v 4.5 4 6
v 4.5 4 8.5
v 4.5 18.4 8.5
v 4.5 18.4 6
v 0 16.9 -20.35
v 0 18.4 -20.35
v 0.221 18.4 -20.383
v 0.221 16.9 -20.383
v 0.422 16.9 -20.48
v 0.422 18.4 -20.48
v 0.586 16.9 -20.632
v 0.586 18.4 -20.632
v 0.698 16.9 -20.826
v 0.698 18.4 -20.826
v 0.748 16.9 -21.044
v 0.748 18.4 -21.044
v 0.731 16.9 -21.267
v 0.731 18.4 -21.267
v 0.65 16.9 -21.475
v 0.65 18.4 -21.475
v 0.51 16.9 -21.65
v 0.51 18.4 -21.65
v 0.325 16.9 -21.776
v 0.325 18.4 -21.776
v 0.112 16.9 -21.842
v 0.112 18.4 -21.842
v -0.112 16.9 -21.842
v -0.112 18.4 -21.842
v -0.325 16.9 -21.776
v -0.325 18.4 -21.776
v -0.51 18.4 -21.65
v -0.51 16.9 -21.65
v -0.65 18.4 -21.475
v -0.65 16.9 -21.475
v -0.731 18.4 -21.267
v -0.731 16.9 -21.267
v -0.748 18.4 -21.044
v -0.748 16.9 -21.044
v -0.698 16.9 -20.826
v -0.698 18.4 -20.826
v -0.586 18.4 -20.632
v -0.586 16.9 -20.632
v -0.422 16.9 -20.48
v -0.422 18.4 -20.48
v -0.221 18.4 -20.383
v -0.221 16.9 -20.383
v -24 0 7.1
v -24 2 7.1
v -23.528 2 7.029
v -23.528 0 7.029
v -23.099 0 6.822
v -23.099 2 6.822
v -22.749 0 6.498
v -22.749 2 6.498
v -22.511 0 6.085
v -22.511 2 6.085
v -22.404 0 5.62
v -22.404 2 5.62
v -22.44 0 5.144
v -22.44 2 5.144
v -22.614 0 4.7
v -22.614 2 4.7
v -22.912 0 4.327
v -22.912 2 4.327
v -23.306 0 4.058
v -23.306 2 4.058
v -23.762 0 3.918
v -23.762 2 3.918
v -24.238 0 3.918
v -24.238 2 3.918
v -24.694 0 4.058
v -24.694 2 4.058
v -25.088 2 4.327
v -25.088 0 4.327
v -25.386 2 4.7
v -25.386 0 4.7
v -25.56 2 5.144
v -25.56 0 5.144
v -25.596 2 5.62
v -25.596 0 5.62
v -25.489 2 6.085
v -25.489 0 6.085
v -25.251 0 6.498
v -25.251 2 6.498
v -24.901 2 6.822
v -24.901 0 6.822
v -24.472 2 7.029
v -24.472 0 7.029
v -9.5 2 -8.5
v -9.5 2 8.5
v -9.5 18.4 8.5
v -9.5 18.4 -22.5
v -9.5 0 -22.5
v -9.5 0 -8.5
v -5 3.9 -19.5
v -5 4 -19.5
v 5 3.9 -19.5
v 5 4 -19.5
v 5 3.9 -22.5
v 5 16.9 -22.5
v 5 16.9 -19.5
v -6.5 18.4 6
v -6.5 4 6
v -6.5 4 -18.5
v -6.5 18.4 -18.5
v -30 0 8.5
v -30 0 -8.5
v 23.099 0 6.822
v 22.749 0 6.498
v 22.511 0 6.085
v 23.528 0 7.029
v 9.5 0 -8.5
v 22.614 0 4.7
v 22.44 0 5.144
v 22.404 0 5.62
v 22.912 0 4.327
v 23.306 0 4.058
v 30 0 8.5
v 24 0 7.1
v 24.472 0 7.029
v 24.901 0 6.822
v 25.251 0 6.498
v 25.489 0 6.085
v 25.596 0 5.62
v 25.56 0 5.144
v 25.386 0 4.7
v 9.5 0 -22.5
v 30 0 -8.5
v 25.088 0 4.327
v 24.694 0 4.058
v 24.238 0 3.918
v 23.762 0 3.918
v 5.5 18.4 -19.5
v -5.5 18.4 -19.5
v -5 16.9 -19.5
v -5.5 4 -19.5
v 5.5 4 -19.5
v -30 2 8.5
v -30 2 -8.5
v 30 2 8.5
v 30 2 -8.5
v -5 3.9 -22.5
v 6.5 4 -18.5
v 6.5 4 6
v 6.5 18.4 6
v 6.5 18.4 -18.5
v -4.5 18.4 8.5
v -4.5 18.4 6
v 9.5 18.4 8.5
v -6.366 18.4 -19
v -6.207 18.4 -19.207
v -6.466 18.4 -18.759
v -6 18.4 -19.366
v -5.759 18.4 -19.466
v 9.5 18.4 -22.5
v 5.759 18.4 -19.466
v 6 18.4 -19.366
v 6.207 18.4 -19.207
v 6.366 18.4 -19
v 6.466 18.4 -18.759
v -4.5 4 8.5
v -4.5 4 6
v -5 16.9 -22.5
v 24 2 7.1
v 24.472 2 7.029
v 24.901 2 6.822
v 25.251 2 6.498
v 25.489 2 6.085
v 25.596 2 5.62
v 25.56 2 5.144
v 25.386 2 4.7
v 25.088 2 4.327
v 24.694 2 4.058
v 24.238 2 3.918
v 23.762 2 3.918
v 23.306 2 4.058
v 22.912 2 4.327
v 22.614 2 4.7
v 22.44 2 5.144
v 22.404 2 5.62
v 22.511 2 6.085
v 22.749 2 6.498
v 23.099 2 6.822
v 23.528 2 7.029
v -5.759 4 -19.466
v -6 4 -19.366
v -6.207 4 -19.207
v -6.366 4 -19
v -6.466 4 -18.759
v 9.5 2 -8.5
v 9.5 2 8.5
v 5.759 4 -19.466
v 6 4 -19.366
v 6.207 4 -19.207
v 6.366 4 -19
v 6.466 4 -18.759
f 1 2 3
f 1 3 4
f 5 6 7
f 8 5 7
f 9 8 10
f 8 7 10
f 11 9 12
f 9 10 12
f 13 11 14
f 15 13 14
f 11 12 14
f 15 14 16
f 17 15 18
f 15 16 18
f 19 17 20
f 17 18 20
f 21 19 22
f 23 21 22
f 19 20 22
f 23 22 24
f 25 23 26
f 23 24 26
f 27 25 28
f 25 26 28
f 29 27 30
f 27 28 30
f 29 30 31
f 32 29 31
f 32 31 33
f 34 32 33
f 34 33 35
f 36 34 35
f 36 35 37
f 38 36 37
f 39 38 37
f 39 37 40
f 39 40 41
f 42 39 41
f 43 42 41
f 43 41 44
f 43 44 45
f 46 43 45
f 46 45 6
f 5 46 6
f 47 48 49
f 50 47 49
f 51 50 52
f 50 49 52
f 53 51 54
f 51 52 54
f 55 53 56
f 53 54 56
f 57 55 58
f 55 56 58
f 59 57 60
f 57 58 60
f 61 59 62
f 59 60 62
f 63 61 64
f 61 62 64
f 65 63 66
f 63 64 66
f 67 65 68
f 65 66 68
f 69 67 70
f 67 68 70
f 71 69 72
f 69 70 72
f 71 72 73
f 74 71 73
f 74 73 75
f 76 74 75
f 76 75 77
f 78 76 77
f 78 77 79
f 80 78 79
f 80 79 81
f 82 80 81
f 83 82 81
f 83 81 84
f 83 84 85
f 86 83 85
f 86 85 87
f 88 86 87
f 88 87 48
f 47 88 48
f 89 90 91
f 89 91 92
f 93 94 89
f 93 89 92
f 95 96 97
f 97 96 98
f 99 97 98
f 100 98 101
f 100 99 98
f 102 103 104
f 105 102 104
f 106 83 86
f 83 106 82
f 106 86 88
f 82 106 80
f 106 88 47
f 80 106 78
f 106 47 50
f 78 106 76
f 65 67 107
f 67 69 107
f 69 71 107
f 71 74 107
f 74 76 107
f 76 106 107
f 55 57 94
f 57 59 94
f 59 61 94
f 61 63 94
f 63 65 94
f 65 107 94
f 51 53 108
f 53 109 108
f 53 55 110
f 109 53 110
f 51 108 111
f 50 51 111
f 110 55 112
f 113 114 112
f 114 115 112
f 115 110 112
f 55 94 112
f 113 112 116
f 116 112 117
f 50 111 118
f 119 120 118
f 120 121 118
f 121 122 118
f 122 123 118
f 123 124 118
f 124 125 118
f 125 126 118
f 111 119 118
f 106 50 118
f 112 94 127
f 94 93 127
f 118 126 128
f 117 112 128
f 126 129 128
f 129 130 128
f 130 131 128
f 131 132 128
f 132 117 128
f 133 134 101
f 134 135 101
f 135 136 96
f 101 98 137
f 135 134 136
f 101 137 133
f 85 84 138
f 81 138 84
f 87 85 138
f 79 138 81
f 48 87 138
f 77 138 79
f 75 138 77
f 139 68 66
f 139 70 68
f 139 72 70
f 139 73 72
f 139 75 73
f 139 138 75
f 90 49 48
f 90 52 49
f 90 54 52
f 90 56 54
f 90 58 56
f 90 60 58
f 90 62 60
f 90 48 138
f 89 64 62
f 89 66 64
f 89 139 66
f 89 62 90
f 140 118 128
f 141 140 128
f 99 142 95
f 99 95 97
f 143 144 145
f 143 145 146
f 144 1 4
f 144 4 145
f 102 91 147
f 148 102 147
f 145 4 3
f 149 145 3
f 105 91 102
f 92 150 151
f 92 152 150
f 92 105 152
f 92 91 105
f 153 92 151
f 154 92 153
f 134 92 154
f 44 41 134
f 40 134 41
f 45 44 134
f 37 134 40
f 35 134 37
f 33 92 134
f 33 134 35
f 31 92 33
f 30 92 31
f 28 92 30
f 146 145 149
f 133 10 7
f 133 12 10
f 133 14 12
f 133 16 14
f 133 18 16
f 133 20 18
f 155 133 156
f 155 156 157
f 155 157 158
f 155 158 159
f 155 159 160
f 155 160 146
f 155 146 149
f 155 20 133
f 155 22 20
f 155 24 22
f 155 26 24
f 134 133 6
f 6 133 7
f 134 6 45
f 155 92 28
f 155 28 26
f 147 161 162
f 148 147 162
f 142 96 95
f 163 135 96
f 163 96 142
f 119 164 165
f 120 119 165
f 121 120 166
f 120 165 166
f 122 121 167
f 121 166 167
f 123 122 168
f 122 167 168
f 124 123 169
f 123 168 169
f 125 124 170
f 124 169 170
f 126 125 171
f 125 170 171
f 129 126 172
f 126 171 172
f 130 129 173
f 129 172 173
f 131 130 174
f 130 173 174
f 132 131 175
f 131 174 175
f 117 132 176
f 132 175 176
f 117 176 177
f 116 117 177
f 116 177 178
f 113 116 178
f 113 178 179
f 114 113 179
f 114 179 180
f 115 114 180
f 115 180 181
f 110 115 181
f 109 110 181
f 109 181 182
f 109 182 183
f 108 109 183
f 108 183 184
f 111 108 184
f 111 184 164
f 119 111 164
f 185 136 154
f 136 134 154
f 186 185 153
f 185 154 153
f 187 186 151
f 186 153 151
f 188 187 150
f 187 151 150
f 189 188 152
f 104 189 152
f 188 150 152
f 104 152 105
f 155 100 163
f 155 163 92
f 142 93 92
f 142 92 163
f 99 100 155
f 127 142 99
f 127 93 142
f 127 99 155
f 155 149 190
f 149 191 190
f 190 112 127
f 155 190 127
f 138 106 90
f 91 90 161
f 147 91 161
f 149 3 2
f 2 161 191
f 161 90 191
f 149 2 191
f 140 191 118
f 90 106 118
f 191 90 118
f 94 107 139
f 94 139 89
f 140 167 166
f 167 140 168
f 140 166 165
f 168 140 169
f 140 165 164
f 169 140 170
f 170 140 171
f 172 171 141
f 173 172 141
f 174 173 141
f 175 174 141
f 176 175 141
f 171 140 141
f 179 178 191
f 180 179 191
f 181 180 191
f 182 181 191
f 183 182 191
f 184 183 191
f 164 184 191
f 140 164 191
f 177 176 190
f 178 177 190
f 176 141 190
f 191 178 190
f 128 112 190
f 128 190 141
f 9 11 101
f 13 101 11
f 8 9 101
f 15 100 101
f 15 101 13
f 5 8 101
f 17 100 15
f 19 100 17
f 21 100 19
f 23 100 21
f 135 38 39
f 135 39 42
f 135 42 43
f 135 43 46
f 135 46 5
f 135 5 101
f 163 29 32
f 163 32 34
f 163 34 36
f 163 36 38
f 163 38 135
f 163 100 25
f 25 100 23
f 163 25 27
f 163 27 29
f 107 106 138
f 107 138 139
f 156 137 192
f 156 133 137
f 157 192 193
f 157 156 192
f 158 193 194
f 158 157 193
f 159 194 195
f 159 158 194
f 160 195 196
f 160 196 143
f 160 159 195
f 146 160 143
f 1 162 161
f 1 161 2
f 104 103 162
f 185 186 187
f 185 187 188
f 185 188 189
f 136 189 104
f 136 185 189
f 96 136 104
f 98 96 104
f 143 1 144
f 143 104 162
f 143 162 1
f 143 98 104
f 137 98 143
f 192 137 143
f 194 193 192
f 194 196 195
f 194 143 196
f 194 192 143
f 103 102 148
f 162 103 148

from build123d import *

# Parameters (mm, degrees)
SKETCH1_W           = 60
SKETCH1_H           = 17
BOSS_EXTRUDE1_DEPTH = 4
SKETCH4_W           = 19
SKETCH4_H           = 4
BOSS_EXTRUDE2_DEPTH = 14
SKETCH5_W           = 3
SKETCH5_H           = 31
BOSS_EXTRUDE3_DEPTH = 14.4
SKETCH6_W           = 13
SKETCH6_H           = 2.5
BOSS_EXTRUDE4_DEPTH = 14.4
SKETCH7_W           = 9
SKETCH7_H           = 2.5
CUT_EXTRUDE1_DEPTH  = 14.4
SKETCH8_W           = 13
SKETCH8_H           = 3
BOSS_EXTRUDE5_DEPTH = 14.4
SKETCH9_R           = 0.75
CUT_EXTRUDE2_DEPTH  = 6
SKETCH10_W          = 10
SKETCH10_H          = 8
CUT_EXTRUDE3_DEPTH  = 3
FILLET1_R           = 1
SKETCH11_R          = 1.6
CUT_EXTRUDE4_DEPTH  = 4
SKETCH12_W          = 20.5
SKETCH12_H          = 17
CUT_EXTRUDE5_DEPTH  = 2
SKETCH13_W          = 10
SKETCH13_H          = 3
CUT_EXTRUDE6_DEPTH  = 5


with BuildPart() as part:
    # Sketch1 → Boss-Extrude1 (new body)
    with BuildSketch(Plane(origin=(0, 0, 0), x_dir=(1, 0, 0), z_dir=(0, 1, 0))):
        Rectangle(SKETCH1_W, SKETCH1_H)
    extrude(amount=BOSS_EXTRUDE1_DEPTH)

    # Sketch4 → Boss-Extrude2 (add)
    with BuildSketch(Plane(origin=(0, 0, -8.5), x_dir=(-1, 0, 0), z_dir=(0, 0, -1))):
        with Locations((0, 2)):
            Rectangle(SKETCH4_W, SKETCH4_H)
    extrude(amount=BOSS_EXTRUDE2_DEPTH)

    # Sketch5 → Boss-Extrude3 (add)
    with BuildSketch(Plane(origin=(0, 4, 0), x_dir=(1, 0, 0), z_dir=(0, 1, 0))):
        with Locations((-8, 7)):
            Rectangle(SKETCH5_W, SKETCH5_H)
    boss_extrude3 = extrude(amount=BOSS_EXTRUDE3_DEPTH)

    # Mirror1: Boss-Extrude3 across plane
    add(boss_extrude3.mirror(Plane(origin=(0, 0, 0), x_dir=(0, 0, 1), z_dir=(1, 0, 0))))

    # Sketch6 → Boss-Extrude4 (add)
    with BuildSketch(Plane(origin=(0, 4, 0), x_dir=(1, 0, 0), z_dir=(0, 1, 0))):
        with Locations((0, -7.25)):
            Rectangle(SKETCH6_W, SKETCH6_H)
    extrude(amount=BOSS_EXTRUDE4_DEPTH)

    # Sketch7 → Cut-Extrude1 (cut)
    with BuildSketch(Plane(origin=(0, 18.4, 0), x_dir=(1, 0, 0), z_dir=(0, 1, 0))):
        with Locations((0, -7.25)):
            Rectangle(SKETCH7_W, SKETCH7_H)
    extrude(amount=-CUT_EXTRUDE1_DEPTH, mode=Mode.SUBTRACT)

    # Sketch8 → Boss-Extrude5 (add)
    with BuildSketch(Plane(origin=(0, 4, 0), x_dir=(1, 0, 0), z_dir=(0, 1, 0))):
        with Locations((0, 21)):
            Rectangle(SKETCH8_W, SKETCH8_H)
    extrude(amount=BOSS_EXTRUDE5_DEPTH)

    # Sketch9 → Cut-Extrude2 (cut)
    with BuildSketch(Plane(origin=(0, 18.4, 0), x_dir=(1, 0, 0), z_dir=(0, 1, 0))):
        with Locations(Location((0, 21.1, 0), (0, 0, 270))):
            Circle(SKETCH9_R)
    extrude(amount=-CUT_EXTRUDE2_DEPTH, mode=Mode.SUBTRACT)

    # Sketch10 → Cut-Extrude3 (cut)
    with BuildSketch(Plane(origin=(0, 0, -22.5), x_dir=(-1, 0, 0), z_dir=(0, 0, -1))):
        with Locations((0, 12.9)):
            Rectangle(SKETCH10_W, SKETCH10_H)
    extrude(amount=-CUT_EXTRUDE3_DEPTH, mode=Mode.SUBTRACT)

    # Fillet1
    fillet1_edges = [part.edges().sort_by_distance(p)[0] for p in [
        (-6.5, 11.2, -19.5),
        (6.5, 11.2, -19.5),
    ]]
    fillet(fillet1_edges, radius=FILLET1_R)

    # Sketch11 → Cut-Extrude4 (cut)
    with BuildSketch(Plane(origin=(0, 4, 0), x_dir=(1, 0, 0), z_dir=(0, 1, 0))):
        with Locations(Location((-24, -5.5, 0), (0, 0, 270))):
            Circle(SKETCH11_R)
        with Locations(Location((24, -5.5, 0), (0, 0, 270))):
            Circle(SKETCH11_R)
    extrude(amount=-CUT_EXTRUDE4_DEPTH, mode=Mode.SUBTRACT)

    # Sketch12 → Cut-Extrude5 (cut)
    with BuildSketch(Plane(origin=(0, 4, 0), x_dir=(1, 0, 0), z_dir=(0, 1, 0))):
        with Locations((-19.75, 0)):
            Rectangle(SKETCH12_W, SKETCH12_H)
    cut_extrude5 = extrude(amount=-CUT_EXTRUDE5_DEPTH, mode=Mode.SUBTRACT)

    # Mirror2: Cut-Extrude5 across plane
    add(cut_extrude5.mirror(Plane(origin=(0, 0, 0), x_dir=(0, 0, 1), z_dir=(1, 0, 0))), mode=Mode.SUBTRACT)

    # Sketch13 → Cut-Extrude6 (cut)
    with BuildSketch(Plane(origin=(0, 8.9, 0), x_dir=(1, 0, 0), z_dir=(0, 1, 0))):
        with Locations((0, 21)):
            Rectangle(SKETCH13_W, SKETCH13_H)
    extrude(amount=-CUT_EXTRUDE6_DEPTH, mode=Mode.SUBTRACT)


solid = part.part
